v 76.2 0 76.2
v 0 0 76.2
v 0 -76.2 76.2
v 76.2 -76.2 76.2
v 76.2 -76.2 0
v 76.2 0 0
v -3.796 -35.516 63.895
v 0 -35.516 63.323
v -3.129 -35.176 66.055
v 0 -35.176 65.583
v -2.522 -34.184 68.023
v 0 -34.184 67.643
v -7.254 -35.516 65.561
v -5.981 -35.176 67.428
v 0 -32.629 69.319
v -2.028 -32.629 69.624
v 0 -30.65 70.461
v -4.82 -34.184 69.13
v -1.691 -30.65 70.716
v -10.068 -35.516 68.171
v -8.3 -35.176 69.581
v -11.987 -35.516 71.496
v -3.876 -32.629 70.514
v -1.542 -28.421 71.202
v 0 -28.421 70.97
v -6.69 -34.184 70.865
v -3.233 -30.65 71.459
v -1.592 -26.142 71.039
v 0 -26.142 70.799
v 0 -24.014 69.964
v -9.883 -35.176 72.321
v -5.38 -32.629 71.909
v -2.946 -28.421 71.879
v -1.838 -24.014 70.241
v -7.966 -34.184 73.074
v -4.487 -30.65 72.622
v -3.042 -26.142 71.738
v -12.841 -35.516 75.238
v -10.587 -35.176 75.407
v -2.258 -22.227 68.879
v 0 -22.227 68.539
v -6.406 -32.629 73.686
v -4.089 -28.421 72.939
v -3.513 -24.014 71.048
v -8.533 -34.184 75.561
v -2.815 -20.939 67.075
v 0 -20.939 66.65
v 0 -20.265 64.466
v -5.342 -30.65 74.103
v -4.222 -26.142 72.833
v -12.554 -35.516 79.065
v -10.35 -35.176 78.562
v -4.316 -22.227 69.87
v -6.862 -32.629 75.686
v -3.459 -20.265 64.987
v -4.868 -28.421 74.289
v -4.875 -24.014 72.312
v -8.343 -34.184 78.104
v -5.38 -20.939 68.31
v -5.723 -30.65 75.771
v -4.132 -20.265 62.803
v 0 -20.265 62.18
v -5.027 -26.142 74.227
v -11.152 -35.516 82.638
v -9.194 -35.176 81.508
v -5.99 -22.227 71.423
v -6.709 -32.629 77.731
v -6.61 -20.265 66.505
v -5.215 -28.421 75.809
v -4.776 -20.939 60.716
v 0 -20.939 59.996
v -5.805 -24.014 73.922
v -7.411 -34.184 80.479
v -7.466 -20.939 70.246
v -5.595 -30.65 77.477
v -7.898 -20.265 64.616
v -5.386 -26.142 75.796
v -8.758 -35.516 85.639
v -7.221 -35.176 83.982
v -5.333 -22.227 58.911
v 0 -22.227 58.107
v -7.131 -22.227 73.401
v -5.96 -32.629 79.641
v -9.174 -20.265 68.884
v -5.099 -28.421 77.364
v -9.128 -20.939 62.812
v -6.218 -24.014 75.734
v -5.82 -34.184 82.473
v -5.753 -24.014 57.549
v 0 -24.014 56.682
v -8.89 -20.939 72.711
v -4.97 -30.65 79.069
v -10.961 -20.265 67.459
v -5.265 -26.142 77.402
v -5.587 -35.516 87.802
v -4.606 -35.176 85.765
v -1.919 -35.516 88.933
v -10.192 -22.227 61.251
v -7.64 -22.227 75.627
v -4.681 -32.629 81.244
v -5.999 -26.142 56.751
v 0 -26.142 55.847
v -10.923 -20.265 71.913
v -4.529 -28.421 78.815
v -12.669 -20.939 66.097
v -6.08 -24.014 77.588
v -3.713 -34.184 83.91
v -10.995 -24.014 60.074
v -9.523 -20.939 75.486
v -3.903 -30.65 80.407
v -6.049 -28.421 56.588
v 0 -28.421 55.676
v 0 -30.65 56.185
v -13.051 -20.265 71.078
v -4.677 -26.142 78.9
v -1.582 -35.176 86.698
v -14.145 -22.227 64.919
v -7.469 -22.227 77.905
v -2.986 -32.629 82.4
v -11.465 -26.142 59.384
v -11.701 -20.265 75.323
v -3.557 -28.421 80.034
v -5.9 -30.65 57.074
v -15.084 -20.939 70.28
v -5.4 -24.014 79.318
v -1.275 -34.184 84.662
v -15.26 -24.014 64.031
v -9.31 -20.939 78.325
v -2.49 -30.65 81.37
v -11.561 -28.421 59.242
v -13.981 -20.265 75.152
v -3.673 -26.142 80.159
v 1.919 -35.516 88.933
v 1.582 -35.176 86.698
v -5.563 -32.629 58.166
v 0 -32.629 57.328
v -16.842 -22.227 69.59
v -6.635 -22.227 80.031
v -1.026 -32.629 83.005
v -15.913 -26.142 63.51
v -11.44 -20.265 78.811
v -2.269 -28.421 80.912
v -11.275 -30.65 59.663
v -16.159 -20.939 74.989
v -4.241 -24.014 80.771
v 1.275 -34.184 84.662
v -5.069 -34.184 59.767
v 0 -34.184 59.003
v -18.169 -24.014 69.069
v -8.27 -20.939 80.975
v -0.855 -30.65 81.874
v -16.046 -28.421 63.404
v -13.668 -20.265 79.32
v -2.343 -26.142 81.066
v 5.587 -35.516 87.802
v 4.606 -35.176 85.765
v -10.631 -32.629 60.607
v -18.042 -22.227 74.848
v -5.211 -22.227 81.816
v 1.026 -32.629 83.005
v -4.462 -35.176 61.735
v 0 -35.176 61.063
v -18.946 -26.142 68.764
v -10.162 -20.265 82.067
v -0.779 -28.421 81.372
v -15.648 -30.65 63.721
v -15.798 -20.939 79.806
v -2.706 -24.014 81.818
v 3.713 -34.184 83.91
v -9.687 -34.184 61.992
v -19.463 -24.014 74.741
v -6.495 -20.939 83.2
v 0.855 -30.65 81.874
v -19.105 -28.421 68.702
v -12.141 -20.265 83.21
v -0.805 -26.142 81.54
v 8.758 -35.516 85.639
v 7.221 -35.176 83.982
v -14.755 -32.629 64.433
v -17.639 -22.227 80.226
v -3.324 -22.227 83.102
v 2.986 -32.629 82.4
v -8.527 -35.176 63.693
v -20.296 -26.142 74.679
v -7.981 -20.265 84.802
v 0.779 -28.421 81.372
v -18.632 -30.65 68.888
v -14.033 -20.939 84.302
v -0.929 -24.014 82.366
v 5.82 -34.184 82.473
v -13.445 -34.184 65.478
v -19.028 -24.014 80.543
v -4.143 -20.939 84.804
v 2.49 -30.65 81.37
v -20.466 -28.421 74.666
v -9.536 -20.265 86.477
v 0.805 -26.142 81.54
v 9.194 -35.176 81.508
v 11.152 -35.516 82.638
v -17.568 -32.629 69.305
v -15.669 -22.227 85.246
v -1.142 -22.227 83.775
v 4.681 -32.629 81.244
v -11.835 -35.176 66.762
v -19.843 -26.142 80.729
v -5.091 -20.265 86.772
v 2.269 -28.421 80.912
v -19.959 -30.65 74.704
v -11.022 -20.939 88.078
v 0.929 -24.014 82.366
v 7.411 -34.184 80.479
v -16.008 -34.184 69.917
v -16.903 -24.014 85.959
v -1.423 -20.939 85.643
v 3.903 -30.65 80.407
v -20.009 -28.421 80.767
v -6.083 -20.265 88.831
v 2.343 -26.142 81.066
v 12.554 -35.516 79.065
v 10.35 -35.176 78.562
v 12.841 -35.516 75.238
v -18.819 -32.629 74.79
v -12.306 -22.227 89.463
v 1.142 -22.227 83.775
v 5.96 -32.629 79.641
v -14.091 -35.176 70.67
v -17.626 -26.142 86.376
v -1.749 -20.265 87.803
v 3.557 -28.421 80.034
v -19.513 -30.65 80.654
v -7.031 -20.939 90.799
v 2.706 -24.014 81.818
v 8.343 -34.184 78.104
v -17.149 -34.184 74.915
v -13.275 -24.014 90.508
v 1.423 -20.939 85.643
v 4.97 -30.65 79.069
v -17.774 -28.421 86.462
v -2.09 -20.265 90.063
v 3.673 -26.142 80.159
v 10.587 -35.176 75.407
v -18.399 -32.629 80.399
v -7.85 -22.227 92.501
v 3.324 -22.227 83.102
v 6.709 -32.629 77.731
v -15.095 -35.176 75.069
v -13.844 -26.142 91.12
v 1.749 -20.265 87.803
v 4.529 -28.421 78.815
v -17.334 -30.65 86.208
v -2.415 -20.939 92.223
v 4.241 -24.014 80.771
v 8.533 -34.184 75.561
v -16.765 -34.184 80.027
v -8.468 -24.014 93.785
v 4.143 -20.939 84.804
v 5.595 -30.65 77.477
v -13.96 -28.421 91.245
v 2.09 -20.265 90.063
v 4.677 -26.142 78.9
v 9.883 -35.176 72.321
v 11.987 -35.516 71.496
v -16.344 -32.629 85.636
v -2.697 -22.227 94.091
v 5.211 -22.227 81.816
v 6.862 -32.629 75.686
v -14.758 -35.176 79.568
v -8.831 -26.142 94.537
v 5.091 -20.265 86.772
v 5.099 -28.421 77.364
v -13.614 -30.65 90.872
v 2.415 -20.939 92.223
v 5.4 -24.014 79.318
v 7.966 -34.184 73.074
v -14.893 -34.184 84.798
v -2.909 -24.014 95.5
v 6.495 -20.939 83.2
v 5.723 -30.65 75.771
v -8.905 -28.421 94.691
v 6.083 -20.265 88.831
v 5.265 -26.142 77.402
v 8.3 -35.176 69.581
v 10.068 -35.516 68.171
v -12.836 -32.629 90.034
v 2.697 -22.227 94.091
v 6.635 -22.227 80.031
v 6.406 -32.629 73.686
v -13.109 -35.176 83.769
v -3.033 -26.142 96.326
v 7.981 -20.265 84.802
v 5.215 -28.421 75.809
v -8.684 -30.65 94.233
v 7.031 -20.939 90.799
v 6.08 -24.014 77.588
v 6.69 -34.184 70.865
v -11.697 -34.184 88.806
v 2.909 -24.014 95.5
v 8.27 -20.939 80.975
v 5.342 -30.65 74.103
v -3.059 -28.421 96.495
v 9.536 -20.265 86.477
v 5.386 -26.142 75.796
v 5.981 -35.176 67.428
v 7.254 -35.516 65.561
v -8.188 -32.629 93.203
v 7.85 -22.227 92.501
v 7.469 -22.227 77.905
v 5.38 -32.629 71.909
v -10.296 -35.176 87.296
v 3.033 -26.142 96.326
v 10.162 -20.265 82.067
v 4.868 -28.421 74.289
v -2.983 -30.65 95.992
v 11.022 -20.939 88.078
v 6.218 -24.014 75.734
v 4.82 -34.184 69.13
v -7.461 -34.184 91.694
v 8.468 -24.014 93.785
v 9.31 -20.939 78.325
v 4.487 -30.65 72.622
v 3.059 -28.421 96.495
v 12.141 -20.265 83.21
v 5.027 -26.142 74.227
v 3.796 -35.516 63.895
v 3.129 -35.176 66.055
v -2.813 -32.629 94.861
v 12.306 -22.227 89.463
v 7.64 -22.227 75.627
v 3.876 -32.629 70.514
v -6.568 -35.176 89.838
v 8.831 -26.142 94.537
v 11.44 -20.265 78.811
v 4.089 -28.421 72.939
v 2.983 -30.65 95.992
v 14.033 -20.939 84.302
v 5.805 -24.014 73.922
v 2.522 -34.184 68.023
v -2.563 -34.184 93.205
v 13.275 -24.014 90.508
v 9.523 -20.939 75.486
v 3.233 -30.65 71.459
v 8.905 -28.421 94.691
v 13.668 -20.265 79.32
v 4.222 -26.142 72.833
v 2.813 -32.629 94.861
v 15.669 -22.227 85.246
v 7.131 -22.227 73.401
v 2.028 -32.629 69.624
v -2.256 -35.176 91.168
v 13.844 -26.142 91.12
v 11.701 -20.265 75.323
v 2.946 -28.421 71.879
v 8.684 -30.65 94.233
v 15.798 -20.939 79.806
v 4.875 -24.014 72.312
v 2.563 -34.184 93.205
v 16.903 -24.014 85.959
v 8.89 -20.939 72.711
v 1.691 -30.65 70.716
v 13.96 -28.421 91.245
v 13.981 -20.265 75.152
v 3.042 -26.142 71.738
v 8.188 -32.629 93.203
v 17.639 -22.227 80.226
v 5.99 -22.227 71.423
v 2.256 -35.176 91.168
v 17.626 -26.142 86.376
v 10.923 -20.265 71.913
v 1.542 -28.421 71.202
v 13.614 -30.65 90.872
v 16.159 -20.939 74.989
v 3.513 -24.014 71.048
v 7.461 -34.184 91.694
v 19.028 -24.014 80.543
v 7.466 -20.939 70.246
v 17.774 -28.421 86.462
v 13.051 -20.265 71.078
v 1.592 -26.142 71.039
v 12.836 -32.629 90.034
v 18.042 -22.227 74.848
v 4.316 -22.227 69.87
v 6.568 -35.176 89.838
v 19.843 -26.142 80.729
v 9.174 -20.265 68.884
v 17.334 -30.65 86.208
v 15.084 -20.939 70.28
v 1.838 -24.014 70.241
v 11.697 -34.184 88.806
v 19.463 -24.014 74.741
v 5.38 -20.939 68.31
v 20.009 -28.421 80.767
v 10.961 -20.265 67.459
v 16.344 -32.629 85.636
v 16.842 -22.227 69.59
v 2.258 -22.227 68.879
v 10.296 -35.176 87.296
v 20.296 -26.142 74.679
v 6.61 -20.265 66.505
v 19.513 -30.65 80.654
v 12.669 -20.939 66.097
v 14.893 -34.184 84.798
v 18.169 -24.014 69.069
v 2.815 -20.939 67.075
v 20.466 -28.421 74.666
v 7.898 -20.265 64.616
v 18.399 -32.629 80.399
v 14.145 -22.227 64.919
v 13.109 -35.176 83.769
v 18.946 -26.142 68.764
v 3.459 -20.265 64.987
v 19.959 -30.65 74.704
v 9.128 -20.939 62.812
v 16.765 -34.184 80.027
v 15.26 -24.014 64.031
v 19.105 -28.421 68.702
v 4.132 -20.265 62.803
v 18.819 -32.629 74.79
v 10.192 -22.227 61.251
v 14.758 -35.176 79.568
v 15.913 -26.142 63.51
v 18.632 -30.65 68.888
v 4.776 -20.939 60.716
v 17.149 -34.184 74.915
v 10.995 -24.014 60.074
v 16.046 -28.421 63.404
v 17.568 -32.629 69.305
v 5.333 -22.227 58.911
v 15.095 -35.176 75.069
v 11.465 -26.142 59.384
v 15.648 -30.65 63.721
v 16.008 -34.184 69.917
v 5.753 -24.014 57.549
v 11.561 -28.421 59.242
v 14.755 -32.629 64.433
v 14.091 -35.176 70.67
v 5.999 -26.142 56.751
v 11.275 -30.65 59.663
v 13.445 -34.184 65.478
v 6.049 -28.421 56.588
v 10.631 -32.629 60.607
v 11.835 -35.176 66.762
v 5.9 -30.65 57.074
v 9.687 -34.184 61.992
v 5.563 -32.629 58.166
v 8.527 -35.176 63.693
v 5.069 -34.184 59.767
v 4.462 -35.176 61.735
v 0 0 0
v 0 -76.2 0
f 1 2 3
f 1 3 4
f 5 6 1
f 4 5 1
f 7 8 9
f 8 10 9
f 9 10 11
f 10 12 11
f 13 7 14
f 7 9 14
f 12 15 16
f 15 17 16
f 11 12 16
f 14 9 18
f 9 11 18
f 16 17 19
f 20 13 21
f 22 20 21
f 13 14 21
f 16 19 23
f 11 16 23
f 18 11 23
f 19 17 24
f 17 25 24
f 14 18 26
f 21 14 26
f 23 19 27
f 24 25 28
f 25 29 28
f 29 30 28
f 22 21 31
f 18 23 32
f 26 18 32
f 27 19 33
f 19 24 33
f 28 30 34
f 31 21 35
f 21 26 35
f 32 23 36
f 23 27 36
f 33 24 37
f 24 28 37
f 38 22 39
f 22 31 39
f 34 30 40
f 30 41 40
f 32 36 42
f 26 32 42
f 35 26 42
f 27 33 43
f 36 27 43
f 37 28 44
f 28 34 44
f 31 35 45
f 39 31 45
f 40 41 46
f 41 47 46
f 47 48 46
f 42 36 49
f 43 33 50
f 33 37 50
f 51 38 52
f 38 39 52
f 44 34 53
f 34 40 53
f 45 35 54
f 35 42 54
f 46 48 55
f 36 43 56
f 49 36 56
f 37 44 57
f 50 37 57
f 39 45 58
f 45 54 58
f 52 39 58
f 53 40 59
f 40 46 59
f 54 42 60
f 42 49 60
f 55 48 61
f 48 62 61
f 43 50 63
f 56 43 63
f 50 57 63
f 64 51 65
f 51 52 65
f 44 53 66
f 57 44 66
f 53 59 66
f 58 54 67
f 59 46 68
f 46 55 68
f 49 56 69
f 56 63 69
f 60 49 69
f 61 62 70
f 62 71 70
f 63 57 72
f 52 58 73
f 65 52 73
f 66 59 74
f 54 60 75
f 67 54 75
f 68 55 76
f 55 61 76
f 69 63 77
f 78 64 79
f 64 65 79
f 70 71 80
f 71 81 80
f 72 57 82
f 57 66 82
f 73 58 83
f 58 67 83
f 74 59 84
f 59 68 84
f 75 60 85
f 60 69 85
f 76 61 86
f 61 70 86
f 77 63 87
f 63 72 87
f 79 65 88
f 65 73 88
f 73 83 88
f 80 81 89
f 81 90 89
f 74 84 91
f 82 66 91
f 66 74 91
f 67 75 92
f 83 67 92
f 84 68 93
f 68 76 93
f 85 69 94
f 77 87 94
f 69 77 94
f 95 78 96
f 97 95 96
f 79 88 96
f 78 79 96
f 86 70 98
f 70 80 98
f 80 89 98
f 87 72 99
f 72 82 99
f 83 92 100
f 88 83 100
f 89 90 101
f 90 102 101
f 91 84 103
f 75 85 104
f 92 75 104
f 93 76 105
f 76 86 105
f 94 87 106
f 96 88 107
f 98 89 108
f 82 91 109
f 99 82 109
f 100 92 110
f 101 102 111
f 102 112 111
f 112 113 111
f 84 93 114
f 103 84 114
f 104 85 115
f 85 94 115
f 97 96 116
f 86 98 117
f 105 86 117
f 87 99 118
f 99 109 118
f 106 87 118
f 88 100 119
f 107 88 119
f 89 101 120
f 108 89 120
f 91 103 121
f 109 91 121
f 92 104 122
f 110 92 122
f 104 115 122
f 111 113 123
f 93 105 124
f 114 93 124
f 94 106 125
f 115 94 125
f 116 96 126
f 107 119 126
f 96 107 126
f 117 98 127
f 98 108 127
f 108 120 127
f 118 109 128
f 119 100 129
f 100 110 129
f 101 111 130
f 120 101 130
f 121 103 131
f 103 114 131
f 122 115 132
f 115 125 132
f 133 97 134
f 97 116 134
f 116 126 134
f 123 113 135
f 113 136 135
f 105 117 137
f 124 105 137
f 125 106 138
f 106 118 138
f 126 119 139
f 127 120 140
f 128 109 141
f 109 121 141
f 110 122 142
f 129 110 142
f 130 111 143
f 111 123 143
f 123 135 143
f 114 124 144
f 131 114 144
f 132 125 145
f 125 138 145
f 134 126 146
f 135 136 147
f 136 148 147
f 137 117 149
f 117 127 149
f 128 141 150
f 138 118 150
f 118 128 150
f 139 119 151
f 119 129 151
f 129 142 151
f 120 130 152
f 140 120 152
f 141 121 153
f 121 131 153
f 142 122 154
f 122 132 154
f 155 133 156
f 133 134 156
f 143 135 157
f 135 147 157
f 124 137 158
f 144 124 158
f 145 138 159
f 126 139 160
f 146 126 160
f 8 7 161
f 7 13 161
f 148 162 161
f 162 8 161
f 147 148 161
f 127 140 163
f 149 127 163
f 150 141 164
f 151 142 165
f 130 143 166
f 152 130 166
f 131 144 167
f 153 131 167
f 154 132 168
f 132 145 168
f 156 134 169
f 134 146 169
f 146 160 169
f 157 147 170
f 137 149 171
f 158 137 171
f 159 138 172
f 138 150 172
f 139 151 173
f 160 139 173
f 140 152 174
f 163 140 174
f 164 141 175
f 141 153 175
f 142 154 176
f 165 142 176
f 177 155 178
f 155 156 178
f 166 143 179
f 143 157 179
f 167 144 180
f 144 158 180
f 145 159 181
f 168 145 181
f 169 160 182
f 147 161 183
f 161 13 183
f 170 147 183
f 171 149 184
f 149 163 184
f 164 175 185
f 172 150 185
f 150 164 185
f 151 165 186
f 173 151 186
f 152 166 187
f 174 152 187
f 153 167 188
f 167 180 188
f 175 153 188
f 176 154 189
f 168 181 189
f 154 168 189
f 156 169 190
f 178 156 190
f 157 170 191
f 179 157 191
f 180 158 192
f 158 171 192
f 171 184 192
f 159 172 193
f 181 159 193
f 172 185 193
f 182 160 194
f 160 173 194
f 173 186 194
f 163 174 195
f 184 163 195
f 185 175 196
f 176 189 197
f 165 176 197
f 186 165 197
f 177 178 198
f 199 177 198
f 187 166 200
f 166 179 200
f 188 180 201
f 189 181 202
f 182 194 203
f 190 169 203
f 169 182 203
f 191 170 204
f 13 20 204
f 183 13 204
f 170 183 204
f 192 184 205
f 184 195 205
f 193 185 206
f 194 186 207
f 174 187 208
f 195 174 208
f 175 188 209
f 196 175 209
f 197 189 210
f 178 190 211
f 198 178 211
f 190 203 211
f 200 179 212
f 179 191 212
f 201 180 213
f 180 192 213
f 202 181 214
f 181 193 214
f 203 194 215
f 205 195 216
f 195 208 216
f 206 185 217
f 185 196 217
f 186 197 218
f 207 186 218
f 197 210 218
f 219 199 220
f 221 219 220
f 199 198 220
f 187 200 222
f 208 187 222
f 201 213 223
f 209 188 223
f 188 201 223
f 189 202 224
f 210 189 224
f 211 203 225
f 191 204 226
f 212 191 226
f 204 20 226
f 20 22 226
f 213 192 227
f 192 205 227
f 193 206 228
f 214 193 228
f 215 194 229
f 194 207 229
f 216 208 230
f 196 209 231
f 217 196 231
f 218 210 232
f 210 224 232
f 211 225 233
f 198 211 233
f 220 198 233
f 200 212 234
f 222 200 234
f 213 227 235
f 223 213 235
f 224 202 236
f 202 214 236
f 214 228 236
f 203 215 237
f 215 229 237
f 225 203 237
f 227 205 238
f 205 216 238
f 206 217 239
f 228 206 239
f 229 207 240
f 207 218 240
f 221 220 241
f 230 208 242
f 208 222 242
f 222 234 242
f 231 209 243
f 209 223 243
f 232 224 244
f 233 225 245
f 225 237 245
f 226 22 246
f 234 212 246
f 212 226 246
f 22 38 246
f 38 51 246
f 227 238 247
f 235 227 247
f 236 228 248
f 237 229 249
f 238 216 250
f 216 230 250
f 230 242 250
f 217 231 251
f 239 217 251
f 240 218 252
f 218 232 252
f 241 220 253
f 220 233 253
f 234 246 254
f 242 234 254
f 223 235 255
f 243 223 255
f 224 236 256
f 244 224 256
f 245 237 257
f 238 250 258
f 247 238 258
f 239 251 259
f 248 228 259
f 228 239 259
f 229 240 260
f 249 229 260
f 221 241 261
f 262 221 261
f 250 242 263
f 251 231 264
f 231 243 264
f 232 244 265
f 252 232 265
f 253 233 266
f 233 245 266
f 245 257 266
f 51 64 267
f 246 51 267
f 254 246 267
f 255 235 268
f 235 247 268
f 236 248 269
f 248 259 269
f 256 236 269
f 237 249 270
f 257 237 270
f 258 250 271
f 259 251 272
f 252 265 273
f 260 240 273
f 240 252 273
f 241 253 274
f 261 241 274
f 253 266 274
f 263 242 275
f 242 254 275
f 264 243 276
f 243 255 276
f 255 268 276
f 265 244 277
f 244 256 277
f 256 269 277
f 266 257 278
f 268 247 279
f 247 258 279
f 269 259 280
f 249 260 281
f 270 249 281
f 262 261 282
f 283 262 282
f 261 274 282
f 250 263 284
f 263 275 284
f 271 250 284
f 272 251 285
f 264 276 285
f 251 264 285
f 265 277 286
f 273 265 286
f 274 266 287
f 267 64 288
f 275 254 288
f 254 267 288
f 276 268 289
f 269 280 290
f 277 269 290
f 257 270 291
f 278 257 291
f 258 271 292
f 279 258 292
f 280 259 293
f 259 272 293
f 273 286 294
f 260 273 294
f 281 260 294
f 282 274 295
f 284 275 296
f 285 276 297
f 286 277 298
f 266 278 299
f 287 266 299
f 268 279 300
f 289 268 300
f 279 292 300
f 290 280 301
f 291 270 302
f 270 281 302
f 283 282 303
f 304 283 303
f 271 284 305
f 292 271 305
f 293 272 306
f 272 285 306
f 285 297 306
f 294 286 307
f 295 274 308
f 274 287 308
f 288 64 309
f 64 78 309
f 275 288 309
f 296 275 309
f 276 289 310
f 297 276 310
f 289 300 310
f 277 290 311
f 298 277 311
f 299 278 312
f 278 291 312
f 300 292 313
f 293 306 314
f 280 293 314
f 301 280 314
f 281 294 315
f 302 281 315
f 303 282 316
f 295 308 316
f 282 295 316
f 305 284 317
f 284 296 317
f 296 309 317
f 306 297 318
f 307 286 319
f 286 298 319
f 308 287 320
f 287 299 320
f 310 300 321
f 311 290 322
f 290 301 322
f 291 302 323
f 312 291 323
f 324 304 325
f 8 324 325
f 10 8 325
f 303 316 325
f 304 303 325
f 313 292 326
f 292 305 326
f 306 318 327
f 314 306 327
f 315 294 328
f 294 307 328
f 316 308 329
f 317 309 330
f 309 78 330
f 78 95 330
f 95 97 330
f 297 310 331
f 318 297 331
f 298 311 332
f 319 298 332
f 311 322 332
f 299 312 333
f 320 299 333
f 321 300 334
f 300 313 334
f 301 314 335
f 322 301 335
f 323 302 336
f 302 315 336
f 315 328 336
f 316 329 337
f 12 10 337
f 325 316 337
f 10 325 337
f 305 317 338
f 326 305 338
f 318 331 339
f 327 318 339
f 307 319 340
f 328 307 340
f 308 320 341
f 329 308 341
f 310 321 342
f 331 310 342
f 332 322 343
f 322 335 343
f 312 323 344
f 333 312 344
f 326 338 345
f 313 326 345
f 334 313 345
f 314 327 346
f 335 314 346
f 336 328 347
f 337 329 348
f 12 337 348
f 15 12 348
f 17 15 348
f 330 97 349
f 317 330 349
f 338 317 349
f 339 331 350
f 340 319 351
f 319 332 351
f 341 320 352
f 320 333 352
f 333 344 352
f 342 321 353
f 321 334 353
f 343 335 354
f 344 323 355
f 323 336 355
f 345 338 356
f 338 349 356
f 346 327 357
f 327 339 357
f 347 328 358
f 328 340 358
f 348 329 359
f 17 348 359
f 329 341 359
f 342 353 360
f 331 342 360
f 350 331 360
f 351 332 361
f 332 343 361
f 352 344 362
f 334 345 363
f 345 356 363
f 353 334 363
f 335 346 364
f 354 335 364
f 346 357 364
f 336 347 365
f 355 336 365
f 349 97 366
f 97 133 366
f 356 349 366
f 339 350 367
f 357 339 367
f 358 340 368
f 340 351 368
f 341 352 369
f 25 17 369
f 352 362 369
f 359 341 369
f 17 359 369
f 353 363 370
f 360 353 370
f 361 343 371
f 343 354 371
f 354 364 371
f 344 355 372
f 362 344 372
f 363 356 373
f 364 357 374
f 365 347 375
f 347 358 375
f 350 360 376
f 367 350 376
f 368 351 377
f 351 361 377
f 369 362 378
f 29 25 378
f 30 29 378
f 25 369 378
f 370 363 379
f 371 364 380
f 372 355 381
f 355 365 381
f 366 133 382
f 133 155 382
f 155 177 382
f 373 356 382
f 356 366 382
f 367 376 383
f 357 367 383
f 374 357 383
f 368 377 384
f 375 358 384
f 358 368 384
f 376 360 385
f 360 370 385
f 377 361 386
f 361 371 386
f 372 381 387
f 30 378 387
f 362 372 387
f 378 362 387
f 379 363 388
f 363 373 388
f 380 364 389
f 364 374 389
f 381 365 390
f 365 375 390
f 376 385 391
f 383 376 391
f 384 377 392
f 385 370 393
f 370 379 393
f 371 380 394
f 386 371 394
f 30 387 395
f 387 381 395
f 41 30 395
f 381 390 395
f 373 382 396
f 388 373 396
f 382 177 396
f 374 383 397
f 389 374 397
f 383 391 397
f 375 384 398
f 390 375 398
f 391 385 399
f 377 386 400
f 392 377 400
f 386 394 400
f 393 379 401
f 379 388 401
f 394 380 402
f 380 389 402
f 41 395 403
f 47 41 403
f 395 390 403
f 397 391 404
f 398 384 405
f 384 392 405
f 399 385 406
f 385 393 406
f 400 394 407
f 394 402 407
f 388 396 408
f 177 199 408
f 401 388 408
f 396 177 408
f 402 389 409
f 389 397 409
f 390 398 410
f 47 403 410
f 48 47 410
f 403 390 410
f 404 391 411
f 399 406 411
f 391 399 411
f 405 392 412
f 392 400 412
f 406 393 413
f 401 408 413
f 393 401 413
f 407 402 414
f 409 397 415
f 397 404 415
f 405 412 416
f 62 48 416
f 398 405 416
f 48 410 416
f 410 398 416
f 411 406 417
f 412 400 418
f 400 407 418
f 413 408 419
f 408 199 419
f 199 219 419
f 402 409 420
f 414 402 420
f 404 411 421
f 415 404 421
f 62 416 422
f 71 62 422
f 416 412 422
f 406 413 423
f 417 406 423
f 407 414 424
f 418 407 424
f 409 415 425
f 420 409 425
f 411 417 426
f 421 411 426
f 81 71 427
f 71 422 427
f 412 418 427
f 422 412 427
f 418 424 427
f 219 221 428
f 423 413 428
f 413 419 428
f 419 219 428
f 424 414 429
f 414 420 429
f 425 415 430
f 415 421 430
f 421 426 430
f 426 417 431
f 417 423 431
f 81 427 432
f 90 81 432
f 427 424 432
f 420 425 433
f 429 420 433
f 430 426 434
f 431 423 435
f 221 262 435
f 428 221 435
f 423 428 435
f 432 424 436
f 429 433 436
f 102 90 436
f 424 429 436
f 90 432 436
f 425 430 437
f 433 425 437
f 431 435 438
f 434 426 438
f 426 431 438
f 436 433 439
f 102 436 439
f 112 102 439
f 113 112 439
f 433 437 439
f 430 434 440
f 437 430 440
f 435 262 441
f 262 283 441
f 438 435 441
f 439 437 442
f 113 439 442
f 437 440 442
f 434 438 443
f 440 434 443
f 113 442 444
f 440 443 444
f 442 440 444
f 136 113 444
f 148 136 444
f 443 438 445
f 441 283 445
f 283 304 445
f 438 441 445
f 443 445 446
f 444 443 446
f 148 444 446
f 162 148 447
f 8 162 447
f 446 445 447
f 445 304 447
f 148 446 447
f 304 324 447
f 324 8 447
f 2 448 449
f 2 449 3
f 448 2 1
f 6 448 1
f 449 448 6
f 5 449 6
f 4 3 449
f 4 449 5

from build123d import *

# Parameters (mm, degrees)
F0_W     = 76.2
F0_H     = 76.2
F1_DEPTH = 76.2
F5_R     = 7.6683459061


# Not quite as in the source:
# - the program builds the solid bodies; features that only make, move or delete a surface that nothing else refers to are left out


with BuildPart() as f1:
    # F0 (on Front) → F1 (new body)
    with BuildSketch(Plane.XZ):
        with Locations((38.1, 38.1)):
            Rectangle(F0_W, F0_H)
    extrude(amount=F1_DEPTH)


with BuildPart() as f6:
    # F5 (on face) → F6 (revolve)
    with BuildSketch(Plane(origin=(0, 0, 0), x_dir=(0, -1, 0), z_dir=(-1, 0, 0))):
        with Locations((27.8481394053, 63.3231475949)):
            Circle(F5_R)
    revolve(axis=Axis((0, -38.1, 76.2), (0, 1, 0)))


solid = Compound([f1.part, f6.part])
